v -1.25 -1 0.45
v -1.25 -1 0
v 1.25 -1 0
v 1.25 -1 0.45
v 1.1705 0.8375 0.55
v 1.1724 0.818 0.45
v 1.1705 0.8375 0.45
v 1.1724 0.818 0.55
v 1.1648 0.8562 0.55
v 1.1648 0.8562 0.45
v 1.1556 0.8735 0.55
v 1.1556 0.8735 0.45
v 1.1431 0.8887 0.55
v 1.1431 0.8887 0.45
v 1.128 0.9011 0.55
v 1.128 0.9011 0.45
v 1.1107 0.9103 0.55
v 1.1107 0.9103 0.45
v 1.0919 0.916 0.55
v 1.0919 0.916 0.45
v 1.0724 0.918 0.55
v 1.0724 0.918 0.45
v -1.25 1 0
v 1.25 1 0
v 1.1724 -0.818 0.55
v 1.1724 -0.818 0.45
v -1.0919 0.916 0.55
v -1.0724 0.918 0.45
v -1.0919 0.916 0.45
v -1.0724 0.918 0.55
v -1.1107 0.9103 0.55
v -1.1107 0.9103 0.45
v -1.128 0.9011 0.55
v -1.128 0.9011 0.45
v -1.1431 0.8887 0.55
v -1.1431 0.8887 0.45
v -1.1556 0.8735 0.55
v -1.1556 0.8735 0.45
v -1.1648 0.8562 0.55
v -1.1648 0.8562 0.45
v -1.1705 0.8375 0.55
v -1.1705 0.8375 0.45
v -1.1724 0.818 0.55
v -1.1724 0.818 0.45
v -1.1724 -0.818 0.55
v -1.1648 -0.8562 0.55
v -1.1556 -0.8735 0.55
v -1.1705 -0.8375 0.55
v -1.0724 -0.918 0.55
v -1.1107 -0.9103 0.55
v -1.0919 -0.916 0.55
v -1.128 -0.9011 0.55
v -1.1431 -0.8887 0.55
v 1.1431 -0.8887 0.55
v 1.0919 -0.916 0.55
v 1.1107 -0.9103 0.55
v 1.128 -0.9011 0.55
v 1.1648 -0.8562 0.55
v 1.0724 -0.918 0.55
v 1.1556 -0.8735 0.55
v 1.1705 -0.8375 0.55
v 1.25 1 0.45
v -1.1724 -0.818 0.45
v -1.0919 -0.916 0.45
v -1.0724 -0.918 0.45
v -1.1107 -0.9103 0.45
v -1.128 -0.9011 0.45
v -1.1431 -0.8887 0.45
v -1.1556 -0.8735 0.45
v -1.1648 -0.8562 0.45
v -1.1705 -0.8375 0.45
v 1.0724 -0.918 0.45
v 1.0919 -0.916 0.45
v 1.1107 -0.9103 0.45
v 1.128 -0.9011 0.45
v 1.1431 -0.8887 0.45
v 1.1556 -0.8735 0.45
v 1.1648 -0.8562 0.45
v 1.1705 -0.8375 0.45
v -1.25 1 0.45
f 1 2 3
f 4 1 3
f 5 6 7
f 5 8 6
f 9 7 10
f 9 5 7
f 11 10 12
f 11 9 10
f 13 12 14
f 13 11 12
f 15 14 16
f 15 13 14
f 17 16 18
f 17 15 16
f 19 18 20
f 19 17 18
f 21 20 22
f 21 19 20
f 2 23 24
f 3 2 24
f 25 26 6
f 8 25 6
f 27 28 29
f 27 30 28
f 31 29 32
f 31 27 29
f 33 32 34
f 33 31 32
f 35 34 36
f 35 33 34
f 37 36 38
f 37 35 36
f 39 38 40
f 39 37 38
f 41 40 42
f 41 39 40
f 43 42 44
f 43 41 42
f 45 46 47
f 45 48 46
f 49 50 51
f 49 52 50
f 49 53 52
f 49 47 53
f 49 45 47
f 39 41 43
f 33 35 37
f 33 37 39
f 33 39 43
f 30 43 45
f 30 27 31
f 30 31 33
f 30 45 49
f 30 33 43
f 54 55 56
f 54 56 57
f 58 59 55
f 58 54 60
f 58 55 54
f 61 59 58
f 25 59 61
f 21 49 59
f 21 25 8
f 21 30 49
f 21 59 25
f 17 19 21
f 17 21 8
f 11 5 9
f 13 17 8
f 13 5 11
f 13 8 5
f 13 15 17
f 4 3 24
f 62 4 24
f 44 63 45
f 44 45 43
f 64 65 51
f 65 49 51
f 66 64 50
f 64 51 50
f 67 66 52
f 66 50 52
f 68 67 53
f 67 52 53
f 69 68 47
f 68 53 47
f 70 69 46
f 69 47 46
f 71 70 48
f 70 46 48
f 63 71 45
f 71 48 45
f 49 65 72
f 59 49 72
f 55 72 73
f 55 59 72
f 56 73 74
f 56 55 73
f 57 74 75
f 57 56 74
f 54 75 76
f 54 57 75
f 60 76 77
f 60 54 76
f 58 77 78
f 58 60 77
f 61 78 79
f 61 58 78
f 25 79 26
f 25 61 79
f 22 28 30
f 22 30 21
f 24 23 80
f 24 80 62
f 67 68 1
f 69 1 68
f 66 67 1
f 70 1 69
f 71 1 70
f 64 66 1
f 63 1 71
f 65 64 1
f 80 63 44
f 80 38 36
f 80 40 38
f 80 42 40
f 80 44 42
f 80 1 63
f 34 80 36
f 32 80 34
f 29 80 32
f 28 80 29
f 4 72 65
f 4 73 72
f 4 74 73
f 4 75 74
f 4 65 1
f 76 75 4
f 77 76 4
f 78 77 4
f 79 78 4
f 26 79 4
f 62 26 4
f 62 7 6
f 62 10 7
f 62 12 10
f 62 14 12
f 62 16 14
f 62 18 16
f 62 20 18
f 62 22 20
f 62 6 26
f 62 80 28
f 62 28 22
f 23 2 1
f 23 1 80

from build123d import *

# Parameters (mm, degrees)
SKETCH_W     = 2.5
SKETCH_H     = 2
PAD_DEPTH    = 0.45
SKETCH001_W  = 2.344842
SKETCH001_H  = 1.835908
PAD001_DEPTH = 0.1
FILLET_R     = 0.1


with BuildPart() as part:
    # Sketch → Pad (new body)
    with BuildSketch(Plane.XY):
        Rectangle(SKETCH_W, SKETCH_H)
    extrude(amount=PAD_DEPTH)

    # Sketch001 (on Face6 of Pad) → Pad001 (join)
    with BuildSketch(Plane.XY.offset(0.45)):
        Rectangle(SKETCH001_W, SKETCH001_H)
    extrude(amount=PAD001_DEPTH)

    # Fillet
    fillet_edges = [part.edges().sort_by_distance(p)[0] for p in [
        (1.172421, -0.917954, 0.5),
        (-1.172421, -0.917954, 0.5),
        (1.172421, 0.917954, 0.5),
        (-1.172421, 0.917954, 0.5),
    ]]
    fillet(fillet_edges, radius=FILLET_R)


solid = part.part
